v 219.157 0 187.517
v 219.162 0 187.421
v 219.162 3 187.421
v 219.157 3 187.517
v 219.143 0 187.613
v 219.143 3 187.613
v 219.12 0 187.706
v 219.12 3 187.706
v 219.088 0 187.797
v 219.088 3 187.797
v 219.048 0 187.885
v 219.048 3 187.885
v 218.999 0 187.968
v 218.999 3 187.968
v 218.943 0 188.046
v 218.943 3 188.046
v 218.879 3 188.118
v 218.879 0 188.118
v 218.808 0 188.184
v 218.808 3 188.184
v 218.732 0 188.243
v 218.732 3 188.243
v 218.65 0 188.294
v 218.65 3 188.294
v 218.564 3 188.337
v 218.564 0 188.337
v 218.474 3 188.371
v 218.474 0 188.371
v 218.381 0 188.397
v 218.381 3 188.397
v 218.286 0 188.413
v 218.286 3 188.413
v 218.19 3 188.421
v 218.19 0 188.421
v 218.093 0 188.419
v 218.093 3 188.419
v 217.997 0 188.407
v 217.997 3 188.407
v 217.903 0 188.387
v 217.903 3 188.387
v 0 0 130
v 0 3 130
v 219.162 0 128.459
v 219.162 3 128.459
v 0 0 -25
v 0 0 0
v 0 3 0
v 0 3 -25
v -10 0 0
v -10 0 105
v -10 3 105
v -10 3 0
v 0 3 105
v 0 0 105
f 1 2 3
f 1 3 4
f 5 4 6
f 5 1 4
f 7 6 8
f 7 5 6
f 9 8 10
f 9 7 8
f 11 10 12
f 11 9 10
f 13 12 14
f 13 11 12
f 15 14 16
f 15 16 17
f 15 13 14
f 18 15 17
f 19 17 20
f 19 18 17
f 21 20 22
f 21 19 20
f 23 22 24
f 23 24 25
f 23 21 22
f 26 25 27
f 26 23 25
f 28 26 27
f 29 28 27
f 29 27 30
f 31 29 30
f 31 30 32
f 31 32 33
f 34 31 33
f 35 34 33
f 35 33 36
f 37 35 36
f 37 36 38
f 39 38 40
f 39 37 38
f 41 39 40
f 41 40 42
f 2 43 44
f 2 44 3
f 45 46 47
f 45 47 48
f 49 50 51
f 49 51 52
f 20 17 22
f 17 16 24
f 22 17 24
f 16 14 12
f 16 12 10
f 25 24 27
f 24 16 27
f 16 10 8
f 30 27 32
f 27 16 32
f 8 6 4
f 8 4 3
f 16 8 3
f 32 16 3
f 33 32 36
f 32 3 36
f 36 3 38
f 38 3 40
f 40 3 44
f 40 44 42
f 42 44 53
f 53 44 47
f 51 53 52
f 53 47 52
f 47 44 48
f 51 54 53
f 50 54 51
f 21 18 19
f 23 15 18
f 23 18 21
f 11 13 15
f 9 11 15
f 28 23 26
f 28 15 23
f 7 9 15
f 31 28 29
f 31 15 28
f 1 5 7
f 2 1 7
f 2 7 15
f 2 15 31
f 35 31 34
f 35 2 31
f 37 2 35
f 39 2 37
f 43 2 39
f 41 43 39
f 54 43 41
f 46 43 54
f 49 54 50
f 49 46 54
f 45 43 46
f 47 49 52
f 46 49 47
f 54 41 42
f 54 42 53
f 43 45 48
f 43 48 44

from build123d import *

# Parameters (mm, degrees)
BOSS_EXTRUDE1_DEPTH = 3


with BuildPart() as part:
    # Sketch1 → Boss-Extrude1 (new body)
    with BuildSketch(Plane(origin=(0, 0, 0), x_dir=(1, 0, 0), z_dir=(0, 1, 0))):
        with BuildLine():
            Line((0, -130), (0, -105))
            Line((0, -105), (-10, -105))
            Line((-10, -105), (-10, 0))
            Line((-10, 0), (0, 0))
            Line((0, 0), (0, 25))
            Line((0, 25), (219.162, -128.458884489))
            Line((219.162, -128.458884489), (219.162, -187.421055539))
            ThreePointArc((219.162, -187.421055539), (218.770761429, -188.214408879), (217.903180955, -188.386981365))
            Line((217.903180955, -188.386981365), (0, -130))
        make_face()
    extrude(amount=BOSS_EXTRUDE1_DEPTH)


solid = part.part
